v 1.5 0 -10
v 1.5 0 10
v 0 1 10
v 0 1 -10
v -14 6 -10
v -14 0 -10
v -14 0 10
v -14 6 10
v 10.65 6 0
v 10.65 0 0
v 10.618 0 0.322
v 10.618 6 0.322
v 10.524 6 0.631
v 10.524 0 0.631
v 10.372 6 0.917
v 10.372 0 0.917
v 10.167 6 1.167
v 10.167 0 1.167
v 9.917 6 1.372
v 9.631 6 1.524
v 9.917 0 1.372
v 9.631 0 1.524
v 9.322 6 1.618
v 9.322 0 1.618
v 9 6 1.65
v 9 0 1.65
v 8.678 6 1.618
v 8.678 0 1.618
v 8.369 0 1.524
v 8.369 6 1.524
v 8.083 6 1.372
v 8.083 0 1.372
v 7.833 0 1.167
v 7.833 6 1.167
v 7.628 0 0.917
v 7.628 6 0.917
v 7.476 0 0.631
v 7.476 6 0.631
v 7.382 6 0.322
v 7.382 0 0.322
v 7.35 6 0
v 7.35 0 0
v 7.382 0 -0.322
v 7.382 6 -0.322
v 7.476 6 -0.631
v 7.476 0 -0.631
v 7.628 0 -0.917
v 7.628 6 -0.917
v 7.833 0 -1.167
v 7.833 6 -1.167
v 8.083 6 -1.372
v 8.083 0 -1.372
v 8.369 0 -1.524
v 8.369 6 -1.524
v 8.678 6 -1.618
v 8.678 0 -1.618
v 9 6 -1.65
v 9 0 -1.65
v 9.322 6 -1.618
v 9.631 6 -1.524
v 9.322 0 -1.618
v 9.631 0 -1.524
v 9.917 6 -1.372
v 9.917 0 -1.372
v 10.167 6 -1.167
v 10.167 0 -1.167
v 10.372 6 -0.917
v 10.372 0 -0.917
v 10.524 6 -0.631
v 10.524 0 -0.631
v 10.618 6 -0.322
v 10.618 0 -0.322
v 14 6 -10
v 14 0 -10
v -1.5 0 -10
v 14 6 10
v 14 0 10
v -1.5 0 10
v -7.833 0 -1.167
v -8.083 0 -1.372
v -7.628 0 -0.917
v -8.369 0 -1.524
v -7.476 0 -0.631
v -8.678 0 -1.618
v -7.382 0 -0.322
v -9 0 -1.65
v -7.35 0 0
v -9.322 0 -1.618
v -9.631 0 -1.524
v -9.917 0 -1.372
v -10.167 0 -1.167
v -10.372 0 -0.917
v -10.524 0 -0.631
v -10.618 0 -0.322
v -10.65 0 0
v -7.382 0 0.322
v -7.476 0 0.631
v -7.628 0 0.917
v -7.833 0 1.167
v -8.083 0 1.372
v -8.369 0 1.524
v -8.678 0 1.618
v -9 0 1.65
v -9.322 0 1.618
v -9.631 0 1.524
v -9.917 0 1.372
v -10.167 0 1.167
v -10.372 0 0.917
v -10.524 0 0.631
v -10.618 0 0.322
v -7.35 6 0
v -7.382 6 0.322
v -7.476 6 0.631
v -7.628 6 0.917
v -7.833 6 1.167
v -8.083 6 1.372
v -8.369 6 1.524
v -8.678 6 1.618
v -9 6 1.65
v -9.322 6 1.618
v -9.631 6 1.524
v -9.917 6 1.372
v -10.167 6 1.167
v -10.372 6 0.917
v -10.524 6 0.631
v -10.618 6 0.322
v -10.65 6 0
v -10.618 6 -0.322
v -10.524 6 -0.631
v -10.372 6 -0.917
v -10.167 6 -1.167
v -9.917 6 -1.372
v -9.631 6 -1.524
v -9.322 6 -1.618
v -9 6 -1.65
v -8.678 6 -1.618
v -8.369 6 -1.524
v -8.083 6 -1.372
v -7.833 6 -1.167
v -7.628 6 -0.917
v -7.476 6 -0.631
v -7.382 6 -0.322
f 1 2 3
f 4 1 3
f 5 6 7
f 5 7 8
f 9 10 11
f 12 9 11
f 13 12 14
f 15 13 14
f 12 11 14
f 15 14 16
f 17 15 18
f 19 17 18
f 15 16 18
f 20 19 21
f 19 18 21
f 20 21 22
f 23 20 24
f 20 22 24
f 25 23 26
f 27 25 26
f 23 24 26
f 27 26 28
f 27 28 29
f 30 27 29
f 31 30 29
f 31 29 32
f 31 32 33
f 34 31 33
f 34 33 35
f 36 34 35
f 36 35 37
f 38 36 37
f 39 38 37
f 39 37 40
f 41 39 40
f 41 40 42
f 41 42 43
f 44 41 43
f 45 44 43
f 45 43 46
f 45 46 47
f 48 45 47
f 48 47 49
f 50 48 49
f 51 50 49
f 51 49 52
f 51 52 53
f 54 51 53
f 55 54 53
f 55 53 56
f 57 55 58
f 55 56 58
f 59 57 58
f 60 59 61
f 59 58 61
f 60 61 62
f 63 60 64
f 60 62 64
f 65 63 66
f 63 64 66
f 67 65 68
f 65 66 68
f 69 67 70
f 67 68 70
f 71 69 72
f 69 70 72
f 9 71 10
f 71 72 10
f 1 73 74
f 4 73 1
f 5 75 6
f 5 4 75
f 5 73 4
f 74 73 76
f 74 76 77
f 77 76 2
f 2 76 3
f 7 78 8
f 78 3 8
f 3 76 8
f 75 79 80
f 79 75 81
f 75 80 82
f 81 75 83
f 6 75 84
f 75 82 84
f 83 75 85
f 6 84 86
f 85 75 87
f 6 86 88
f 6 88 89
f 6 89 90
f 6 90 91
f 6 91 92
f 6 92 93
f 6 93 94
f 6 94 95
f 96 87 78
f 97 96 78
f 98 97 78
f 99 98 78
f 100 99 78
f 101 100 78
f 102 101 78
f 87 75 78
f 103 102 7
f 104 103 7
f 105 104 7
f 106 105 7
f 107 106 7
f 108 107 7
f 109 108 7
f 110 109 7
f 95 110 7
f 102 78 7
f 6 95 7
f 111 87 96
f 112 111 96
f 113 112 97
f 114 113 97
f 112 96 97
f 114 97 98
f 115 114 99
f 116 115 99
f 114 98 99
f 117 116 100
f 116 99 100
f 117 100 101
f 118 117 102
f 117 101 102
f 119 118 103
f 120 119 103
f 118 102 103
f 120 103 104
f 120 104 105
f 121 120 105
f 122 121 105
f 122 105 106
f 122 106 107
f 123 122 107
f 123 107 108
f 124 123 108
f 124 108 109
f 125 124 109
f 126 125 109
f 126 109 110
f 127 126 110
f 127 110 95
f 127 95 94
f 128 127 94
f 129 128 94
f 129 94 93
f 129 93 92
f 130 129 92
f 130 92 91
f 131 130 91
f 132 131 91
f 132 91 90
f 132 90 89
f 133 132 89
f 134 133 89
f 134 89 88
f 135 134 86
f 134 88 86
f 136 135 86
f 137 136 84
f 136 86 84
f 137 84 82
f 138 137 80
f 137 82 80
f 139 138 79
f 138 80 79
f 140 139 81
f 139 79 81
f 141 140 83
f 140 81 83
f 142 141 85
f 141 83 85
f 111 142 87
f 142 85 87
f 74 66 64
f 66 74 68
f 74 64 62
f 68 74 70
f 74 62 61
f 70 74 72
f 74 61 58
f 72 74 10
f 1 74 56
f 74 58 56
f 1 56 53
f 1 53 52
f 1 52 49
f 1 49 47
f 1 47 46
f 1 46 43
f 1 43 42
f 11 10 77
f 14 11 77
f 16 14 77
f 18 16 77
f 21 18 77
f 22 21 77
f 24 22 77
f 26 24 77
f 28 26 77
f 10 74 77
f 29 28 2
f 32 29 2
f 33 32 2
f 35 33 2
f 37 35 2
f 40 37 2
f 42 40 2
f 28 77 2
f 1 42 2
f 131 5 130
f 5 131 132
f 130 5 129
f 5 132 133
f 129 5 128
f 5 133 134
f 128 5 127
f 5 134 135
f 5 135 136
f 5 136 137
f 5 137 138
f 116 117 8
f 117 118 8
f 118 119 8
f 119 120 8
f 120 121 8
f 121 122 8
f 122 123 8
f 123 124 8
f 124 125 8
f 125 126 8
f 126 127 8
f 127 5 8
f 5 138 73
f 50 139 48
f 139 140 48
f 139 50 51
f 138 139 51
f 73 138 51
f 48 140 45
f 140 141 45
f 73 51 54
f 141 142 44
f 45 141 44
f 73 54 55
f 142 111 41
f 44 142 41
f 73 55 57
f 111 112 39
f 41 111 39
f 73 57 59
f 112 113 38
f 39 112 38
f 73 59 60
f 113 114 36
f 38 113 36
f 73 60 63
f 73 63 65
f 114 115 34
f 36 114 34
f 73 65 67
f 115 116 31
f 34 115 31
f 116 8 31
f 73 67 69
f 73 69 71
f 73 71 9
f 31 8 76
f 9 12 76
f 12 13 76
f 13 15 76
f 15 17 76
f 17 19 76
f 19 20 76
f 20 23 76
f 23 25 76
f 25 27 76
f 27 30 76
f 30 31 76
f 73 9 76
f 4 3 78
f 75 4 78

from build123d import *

# Parameters (mm, degrees)
RESSALTO_EXTRUS_O1_DEPTH = 10
ESBO_O2_R                = 1.65
CORTE_EXTRUS_O1_DEPTH    = 15


with BuildPart() as part:
    # Esboço1 → Ressalto-extrusão1 (new body, symmetric)
    with BuildSketch(Plane.XY):
        Polygon((-1.5, 0), (-14, 0), (-14, 6), (14, 6), (14, 0), (1.5, 0), (0, 1), align=None)
    extrude(amount=RESSALTO_EXTRUS_O1_DEPTH, both=True)

    # Esboço2 → Corte-extrusão1 (cut)
    with BuildSketch(Plane.XZ):
        with Locations((-9, 0)):
            Circle(ESBO_O2_R)
        with Locations((9, 0)):
            Circle(ESBO_O2_R)
    extrude(amount=-CORTE_EXTRUS_O1_DEPTH, mode=Mode.SUBTRACT)


solid = part.part
